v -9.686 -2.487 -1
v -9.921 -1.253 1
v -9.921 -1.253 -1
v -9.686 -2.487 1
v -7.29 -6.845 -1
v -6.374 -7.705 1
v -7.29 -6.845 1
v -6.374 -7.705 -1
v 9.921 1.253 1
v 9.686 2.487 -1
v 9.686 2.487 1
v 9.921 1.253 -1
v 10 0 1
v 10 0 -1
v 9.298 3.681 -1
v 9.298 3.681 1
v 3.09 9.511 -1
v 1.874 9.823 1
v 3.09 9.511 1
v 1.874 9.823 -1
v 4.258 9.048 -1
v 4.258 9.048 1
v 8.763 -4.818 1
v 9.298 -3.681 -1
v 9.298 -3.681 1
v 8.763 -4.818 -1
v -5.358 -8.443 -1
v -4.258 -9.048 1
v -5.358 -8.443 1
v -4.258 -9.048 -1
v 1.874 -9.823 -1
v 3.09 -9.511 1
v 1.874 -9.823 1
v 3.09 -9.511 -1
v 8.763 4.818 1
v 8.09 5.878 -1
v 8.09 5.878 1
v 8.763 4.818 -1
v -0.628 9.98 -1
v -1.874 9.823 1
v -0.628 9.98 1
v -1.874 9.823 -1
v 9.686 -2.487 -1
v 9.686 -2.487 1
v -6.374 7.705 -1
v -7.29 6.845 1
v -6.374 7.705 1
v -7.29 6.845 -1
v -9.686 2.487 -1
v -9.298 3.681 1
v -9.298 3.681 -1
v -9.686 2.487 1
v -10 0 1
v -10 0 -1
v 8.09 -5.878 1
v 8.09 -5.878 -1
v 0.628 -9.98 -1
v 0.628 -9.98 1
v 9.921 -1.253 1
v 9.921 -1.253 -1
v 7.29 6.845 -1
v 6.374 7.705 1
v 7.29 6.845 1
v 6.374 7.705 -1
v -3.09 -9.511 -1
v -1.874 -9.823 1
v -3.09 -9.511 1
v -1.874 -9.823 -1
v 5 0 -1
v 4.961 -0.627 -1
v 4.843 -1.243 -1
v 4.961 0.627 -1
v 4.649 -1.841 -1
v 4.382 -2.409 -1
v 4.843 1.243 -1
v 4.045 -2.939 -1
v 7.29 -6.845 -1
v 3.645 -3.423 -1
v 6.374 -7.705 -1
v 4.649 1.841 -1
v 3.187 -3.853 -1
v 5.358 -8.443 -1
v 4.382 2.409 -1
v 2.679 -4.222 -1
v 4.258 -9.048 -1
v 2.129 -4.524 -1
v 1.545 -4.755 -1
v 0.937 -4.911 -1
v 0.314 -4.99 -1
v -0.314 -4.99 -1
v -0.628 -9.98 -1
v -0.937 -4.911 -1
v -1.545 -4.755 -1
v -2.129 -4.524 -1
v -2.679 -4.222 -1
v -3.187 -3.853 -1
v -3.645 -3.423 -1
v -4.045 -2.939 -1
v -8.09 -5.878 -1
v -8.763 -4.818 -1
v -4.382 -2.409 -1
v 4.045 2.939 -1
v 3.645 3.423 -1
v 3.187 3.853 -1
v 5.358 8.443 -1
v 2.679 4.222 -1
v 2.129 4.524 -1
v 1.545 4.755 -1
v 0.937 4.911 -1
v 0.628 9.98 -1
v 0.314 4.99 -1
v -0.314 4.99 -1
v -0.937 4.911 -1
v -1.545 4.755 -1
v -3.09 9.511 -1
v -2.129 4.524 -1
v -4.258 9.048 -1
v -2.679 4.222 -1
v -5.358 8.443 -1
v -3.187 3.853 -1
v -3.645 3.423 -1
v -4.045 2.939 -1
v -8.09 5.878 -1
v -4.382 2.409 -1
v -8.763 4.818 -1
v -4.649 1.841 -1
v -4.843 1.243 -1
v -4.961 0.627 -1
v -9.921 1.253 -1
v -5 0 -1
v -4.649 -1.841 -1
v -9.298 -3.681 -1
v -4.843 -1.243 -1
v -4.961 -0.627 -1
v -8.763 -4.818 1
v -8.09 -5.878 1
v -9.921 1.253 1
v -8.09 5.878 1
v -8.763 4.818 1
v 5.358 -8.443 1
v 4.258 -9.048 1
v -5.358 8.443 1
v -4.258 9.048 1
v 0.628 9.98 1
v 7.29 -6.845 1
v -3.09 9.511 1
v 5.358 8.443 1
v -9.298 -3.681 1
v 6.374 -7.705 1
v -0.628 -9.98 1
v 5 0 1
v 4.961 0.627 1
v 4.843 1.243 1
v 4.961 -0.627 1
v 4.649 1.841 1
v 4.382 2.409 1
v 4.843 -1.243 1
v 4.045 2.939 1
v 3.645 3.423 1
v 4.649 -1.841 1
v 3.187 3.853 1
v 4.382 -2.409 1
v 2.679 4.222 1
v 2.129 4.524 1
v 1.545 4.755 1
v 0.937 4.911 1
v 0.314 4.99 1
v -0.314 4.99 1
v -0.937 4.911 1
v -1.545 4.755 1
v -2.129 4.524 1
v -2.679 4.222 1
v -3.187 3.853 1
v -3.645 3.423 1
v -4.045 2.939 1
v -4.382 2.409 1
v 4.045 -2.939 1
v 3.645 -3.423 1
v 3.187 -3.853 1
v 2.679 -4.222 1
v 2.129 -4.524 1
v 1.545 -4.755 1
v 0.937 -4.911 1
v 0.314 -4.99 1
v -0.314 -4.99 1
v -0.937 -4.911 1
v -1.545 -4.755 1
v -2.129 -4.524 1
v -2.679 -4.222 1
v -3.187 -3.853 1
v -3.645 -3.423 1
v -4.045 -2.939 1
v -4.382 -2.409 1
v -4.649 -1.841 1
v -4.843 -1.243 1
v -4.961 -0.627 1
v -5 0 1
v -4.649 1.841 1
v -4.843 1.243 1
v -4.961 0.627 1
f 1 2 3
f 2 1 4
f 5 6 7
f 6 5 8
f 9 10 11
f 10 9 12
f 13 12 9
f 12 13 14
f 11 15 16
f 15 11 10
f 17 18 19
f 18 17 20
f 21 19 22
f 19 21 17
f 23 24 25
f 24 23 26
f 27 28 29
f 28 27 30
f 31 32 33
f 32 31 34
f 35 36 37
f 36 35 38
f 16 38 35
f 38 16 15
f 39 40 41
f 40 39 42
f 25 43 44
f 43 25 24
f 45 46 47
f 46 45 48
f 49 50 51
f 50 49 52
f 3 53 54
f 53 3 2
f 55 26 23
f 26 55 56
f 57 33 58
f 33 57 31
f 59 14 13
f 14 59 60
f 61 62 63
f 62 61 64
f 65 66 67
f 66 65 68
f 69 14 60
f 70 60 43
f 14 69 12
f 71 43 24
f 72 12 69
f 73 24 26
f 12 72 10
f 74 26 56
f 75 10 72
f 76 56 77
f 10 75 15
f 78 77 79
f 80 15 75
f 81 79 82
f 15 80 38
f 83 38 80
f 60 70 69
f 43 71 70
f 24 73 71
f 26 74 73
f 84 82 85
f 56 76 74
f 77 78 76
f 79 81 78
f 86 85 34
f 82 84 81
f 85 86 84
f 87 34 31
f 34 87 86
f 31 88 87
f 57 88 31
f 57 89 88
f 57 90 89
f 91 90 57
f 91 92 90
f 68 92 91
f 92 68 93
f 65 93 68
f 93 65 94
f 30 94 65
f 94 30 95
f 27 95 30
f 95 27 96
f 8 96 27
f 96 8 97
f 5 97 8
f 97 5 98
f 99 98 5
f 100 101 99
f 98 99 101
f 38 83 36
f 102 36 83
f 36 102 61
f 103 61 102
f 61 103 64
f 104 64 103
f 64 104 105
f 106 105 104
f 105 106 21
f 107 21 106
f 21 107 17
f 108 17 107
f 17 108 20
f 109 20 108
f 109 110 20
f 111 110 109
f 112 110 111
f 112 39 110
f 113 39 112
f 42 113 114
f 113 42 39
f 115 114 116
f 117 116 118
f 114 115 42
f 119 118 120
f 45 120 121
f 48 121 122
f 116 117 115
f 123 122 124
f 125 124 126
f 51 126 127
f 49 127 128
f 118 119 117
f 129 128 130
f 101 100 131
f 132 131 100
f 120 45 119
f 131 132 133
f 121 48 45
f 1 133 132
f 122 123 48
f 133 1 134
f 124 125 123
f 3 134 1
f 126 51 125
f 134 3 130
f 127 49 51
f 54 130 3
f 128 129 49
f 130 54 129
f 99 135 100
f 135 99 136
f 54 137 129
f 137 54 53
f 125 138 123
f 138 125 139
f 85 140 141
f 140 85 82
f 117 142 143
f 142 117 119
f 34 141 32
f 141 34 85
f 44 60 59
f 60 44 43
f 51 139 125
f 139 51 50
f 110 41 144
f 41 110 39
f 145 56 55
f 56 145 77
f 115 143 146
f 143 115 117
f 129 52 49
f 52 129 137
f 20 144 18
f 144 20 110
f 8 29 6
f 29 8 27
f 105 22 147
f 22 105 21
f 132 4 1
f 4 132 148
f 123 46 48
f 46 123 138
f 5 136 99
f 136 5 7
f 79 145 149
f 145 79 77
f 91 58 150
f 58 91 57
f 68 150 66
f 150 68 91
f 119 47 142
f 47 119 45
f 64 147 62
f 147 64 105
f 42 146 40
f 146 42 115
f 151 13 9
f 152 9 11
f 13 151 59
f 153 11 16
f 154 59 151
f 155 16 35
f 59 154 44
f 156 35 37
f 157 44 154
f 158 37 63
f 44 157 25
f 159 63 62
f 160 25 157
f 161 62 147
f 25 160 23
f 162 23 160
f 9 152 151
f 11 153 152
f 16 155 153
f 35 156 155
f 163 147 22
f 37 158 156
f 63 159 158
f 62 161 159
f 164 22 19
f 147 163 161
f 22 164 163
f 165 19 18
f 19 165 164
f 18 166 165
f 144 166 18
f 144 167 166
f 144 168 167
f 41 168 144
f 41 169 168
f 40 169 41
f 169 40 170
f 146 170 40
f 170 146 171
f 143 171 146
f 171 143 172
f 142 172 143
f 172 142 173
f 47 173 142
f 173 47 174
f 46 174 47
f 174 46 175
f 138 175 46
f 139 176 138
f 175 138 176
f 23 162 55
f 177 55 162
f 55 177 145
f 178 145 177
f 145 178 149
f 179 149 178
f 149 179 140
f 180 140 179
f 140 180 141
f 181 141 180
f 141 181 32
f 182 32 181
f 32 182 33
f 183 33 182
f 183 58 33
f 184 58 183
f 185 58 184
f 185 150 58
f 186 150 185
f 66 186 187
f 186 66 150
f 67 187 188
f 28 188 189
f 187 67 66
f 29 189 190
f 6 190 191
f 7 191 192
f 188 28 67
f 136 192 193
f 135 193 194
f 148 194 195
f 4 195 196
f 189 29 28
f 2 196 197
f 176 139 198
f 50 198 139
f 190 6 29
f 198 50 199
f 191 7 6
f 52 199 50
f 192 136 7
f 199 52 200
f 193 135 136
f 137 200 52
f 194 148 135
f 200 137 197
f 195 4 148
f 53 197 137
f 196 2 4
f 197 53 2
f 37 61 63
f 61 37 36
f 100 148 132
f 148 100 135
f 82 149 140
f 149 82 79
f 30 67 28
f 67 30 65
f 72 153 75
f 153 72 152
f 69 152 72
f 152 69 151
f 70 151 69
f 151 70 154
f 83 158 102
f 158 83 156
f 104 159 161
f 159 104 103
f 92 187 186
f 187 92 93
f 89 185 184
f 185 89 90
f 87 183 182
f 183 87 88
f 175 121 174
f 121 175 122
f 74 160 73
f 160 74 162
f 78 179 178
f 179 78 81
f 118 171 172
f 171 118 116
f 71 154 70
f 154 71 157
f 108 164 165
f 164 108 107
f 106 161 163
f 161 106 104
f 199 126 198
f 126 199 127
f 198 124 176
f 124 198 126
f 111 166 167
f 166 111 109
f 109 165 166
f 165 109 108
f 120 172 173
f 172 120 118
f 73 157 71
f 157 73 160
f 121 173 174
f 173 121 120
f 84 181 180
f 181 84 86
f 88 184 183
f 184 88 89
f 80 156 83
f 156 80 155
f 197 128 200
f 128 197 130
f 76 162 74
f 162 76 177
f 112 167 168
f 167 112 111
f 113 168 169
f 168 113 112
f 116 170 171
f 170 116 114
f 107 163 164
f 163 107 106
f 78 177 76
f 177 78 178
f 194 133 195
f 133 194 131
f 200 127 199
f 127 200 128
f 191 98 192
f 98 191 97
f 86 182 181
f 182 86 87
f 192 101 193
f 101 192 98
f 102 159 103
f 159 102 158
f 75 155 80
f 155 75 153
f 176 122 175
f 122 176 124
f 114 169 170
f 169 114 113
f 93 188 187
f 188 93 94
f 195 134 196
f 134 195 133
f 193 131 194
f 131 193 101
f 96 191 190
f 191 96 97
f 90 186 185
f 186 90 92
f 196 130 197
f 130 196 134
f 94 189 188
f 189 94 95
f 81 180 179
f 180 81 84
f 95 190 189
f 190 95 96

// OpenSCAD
$fn = 50;


difference() {
	union() {
		translate(v = [0, 0, -1.0000000000]) {
			cylinder(h = 2, r = 10.0000000000);
		}
	}
	union() {
		translate(v = [0, 0, -100.0000000000]) {
			cylinder(h = 200, r = 5.0000000000);
		}
	}
}
